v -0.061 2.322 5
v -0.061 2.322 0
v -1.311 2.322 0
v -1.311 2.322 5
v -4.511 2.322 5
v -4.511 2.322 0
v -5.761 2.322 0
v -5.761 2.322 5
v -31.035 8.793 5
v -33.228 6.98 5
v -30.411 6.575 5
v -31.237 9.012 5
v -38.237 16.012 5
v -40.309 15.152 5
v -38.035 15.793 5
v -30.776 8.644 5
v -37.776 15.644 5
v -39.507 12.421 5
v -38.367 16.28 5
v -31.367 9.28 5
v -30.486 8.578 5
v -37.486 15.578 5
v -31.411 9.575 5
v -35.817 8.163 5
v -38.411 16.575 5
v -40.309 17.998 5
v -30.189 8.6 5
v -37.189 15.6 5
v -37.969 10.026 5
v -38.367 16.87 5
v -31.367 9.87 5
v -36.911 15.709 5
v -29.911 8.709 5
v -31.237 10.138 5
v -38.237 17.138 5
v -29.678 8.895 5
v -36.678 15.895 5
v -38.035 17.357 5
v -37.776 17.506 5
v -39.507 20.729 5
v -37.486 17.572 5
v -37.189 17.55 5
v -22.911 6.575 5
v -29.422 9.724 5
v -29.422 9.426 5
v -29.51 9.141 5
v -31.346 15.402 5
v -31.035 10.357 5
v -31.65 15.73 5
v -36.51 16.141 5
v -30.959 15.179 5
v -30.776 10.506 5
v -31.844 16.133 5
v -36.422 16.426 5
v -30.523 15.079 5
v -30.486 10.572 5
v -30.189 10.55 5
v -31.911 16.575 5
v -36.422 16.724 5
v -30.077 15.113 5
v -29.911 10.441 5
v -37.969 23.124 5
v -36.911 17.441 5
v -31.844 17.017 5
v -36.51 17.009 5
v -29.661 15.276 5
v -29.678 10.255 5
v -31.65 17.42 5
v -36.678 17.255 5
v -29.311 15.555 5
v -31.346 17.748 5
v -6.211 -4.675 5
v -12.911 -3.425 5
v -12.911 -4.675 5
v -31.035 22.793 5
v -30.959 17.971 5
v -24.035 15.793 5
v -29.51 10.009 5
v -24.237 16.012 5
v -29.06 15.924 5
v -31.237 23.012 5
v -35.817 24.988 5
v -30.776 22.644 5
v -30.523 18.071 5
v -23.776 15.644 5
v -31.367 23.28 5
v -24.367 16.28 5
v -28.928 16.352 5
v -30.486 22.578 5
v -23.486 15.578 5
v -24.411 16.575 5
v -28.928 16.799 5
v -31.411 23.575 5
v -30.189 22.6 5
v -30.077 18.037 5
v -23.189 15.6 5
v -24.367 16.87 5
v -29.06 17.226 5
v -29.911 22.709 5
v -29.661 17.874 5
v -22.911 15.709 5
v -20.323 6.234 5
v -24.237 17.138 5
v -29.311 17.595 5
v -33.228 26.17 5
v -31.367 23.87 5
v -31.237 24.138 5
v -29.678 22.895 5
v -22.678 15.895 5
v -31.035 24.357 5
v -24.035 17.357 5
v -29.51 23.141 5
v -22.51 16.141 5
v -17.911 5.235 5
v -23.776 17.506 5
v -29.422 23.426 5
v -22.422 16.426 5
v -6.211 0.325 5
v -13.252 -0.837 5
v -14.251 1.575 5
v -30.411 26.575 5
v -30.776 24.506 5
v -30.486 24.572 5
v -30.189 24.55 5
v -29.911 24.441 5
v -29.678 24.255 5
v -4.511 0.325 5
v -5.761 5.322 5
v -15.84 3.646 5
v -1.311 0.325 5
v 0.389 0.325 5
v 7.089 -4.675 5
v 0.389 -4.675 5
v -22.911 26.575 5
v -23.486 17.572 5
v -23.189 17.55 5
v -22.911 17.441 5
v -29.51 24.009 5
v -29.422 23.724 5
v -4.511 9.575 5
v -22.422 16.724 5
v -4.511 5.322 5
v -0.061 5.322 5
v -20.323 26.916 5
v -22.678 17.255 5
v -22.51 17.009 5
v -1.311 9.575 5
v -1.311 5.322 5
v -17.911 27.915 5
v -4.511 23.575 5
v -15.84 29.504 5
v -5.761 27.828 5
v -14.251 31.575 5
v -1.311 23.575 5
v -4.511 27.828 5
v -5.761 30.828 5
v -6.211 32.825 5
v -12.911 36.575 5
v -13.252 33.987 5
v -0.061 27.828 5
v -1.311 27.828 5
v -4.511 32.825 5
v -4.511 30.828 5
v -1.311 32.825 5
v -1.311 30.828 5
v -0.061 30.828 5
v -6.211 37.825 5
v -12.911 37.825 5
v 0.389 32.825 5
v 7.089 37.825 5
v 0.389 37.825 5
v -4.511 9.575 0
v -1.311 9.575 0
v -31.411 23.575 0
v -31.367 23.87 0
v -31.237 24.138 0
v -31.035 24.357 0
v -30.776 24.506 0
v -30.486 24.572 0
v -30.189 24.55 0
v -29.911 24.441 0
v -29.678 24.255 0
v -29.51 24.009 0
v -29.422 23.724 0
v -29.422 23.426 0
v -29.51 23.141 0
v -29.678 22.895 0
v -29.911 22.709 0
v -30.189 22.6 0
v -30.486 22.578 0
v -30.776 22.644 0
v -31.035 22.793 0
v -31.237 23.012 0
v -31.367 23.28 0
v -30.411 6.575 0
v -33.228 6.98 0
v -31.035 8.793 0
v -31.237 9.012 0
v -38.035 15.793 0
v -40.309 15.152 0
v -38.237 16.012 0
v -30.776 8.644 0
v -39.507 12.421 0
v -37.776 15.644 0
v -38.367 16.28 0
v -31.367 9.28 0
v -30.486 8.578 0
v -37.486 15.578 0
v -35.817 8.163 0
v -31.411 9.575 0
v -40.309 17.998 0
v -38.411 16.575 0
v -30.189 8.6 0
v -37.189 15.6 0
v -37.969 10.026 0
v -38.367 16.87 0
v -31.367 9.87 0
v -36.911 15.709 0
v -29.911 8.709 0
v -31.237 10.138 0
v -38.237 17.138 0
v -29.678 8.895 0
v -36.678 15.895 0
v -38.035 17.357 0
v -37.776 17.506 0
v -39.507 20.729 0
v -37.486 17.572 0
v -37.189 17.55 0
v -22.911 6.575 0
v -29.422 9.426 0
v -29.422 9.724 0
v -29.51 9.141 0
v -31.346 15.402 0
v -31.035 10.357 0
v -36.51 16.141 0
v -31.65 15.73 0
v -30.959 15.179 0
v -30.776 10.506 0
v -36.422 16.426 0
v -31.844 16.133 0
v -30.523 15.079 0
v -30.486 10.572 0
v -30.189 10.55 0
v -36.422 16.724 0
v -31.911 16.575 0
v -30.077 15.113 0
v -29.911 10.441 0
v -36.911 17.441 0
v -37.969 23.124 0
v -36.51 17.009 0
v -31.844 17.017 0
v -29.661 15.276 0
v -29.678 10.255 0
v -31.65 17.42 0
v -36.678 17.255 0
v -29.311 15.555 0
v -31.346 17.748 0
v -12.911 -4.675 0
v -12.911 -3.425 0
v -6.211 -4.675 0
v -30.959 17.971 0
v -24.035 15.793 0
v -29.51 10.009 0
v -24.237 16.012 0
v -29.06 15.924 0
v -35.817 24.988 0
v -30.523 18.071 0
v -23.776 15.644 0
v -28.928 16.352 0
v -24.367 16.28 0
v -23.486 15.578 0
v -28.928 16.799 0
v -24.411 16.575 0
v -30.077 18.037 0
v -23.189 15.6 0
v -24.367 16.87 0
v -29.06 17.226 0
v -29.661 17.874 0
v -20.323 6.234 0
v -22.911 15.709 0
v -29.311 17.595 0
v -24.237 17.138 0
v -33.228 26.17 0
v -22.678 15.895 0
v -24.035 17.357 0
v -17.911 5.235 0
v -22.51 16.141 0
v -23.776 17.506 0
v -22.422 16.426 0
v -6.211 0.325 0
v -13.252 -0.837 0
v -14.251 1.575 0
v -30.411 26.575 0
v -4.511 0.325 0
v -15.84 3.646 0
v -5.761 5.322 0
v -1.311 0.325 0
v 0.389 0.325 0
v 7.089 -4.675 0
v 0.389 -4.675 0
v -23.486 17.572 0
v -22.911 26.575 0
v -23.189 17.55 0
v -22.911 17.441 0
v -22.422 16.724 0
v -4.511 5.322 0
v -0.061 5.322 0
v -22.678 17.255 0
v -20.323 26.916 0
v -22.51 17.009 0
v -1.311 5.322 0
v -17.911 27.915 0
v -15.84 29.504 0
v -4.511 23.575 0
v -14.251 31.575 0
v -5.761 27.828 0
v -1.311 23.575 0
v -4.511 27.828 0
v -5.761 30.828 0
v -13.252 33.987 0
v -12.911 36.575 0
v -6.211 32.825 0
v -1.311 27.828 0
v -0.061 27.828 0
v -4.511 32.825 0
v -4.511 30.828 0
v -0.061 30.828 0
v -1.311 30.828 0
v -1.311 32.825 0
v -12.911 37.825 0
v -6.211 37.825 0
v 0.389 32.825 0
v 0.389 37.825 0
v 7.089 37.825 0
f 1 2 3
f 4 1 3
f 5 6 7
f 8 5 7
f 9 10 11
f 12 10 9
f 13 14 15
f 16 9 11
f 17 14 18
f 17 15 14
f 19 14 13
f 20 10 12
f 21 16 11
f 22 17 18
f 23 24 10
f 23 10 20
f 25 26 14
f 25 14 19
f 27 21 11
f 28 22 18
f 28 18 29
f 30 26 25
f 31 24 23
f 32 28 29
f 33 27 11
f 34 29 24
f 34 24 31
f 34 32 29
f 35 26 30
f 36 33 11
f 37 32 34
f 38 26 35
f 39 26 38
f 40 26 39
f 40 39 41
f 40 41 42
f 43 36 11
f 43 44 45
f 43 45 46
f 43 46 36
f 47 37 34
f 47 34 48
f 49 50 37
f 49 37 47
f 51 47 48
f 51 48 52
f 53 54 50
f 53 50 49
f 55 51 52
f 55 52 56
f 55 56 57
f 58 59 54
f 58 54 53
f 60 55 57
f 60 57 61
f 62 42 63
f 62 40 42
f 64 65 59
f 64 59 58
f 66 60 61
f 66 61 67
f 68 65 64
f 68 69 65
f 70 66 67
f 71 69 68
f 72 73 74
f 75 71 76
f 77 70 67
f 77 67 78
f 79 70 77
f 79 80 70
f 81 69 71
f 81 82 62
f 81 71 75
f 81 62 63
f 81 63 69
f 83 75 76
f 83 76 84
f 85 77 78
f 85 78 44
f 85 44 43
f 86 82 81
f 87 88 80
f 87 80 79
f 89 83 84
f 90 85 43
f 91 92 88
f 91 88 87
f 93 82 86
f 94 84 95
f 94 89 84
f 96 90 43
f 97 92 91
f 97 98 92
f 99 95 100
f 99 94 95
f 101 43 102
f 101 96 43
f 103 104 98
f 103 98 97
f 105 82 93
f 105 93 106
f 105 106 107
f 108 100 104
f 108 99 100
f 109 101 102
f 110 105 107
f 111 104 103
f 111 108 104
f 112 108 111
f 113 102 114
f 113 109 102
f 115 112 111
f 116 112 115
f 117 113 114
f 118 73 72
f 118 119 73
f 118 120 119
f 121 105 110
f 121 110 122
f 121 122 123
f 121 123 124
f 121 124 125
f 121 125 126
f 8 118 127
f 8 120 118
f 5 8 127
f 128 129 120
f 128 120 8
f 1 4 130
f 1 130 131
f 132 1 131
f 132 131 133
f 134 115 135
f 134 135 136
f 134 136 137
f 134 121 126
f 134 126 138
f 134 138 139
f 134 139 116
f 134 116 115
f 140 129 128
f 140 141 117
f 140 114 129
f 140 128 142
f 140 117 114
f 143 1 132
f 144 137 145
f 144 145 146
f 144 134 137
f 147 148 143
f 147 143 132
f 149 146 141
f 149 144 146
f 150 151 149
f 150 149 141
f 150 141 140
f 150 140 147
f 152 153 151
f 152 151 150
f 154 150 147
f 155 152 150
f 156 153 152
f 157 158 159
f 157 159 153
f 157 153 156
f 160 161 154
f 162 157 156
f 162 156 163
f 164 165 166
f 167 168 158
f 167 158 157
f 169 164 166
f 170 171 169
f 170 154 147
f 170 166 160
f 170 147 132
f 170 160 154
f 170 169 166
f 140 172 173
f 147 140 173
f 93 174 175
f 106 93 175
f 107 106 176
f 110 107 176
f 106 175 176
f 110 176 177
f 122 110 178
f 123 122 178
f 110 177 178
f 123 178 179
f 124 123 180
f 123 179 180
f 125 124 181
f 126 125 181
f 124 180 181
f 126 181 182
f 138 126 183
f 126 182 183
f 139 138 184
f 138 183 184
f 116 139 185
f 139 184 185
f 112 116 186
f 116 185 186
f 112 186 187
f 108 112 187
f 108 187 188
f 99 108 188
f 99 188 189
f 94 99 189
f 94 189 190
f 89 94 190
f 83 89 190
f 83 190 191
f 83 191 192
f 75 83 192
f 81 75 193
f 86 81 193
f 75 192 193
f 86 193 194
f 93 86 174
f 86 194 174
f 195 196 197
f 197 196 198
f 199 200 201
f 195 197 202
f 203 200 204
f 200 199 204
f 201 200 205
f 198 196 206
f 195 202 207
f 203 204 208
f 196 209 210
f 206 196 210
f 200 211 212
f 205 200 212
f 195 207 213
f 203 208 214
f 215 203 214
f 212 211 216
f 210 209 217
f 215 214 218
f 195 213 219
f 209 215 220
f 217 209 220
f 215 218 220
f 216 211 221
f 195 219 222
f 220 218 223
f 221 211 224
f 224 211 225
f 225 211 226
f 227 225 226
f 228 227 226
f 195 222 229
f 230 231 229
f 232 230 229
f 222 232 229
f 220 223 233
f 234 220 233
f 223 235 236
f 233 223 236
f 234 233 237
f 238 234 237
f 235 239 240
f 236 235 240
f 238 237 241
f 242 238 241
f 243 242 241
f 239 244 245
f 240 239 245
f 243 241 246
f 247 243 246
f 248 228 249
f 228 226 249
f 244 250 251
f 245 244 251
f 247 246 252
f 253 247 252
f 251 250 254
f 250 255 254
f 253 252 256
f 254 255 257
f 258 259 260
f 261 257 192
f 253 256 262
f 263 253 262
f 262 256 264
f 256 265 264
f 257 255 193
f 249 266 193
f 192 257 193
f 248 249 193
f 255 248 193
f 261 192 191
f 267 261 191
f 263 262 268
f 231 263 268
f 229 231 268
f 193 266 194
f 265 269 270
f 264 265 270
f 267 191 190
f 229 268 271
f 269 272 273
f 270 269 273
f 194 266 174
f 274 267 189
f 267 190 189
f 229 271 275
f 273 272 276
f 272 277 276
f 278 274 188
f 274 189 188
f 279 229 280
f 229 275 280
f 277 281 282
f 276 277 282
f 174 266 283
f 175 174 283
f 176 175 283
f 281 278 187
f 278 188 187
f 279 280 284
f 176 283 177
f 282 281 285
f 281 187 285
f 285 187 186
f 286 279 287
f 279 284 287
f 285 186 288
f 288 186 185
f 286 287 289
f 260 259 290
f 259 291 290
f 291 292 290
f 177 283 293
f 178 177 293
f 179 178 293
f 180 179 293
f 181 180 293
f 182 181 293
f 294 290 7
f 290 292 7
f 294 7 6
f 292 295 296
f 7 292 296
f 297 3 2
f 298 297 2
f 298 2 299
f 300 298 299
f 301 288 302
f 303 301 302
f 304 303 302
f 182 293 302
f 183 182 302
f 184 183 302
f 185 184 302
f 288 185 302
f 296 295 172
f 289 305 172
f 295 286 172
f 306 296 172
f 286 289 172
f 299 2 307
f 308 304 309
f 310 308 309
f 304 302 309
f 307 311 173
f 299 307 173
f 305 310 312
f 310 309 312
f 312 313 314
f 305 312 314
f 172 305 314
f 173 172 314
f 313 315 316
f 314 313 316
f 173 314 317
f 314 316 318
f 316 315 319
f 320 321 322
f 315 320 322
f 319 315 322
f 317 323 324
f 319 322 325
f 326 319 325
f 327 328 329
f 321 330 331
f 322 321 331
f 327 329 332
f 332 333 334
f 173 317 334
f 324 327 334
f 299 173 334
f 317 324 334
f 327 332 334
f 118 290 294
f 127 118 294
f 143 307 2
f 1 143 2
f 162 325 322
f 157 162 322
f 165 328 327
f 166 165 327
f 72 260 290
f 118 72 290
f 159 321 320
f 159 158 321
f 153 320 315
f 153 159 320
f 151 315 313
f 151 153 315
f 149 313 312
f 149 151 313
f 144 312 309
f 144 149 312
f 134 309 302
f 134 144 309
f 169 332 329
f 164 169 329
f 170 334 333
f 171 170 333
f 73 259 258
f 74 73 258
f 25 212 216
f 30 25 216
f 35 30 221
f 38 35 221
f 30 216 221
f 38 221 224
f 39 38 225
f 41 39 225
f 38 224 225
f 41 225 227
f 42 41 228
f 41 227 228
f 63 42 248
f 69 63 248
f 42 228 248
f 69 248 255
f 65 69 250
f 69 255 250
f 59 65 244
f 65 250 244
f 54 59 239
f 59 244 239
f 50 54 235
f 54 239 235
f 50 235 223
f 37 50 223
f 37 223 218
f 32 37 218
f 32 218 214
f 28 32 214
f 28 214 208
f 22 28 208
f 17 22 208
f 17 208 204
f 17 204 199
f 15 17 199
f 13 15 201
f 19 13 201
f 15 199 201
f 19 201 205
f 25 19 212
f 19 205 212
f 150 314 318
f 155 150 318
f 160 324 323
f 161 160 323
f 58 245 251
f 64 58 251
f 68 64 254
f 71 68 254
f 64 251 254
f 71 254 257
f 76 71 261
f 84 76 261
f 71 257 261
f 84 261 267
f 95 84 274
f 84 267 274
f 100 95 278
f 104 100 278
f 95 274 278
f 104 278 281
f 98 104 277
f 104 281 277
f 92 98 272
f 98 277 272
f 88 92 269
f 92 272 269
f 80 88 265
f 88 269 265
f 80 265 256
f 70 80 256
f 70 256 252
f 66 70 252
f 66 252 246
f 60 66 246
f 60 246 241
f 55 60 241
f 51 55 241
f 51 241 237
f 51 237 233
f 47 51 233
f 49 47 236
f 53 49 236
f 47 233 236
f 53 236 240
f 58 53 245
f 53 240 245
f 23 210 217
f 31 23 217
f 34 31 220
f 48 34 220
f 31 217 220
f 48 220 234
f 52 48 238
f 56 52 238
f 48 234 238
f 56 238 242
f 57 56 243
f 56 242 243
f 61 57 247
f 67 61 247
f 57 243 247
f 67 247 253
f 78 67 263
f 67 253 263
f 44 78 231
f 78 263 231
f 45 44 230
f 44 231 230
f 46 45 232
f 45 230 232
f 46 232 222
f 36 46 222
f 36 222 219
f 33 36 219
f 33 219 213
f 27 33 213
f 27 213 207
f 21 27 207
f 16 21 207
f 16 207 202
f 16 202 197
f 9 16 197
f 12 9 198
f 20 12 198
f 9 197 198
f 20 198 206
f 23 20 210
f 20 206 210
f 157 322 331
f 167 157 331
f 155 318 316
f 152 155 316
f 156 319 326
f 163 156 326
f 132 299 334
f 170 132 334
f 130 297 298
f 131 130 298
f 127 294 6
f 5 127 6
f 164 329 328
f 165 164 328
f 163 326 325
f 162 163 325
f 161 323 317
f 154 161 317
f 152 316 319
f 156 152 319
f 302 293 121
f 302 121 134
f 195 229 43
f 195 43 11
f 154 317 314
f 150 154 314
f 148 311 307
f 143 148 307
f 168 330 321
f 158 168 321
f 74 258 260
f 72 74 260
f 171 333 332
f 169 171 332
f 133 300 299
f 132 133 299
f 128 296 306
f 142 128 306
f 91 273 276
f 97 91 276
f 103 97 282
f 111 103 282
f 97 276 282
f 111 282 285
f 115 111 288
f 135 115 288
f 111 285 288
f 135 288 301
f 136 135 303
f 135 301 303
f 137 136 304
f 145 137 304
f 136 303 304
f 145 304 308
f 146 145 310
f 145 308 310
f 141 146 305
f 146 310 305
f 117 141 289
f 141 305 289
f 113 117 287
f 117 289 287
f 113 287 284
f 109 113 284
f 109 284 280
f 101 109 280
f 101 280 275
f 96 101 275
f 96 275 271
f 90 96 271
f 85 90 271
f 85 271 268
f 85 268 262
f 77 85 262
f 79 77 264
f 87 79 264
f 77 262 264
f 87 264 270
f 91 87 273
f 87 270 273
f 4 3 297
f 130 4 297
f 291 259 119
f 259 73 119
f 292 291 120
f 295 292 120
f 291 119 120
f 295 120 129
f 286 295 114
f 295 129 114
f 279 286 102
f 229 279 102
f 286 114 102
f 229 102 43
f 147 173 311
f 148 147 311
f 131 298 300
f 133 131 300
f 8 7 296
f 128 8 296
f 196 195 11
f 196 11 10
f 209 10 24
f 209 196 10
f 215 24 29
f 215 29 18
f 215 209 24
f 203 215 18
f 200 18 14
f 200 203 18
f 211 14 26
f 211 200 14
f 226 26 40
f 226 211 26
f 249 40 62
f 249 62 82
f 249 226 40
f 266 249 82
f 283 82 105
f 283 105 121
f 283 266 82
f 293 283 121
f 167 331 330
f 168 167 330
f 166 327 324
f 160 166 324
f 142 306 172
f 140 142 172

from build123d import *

# Parameters (mm, degrees)
BOSS_EXTRU_1_DEPTH = 5
ESQUISSE2_R        = 1.5
ESQUISSE2_R_2      = 1
BOSS_EXTRU_2_DEPTH = 5
CONG_1_R           = 10


with BuildPart() as part:
    # Esquisse1 → Boss.-Extru.1 (new body)
    with BuildSketch(Plane.XY):
        Polygon((-12.911051911, 37.825067336), (-12.911051911, -4.674932664), (-6.211051911, -4.674932664), (-6.211051911, 0.325067336), (-4.511051911, 0.325067336), (-4.511051911, 2.321763371), (-5.761051911, 2.321763371), (-5.761051911, 5.321763371), (-4.511051911, 5.321763371), (-4.511051911, 9.575067336), (-1.311051911, 9.575067336), (-1.311051911, 5.321763371), (-0.061051911, 5.321763371), (-0.061051911, 2.321763371), (-1.311051911, 2.321763371), (-1.311051911, 0.325067336), (0.388948089, 0.325067336), (0.388948089, -4.674932664), (7.088948089, -4.674932664), (7.088948089, 37.825067336), (0.388948089, 37.825067336), (0.388948089, 32.825067336), (-1.311051911, 32.825067336), (-1.311051911, 30.828371301), (-0.061051911, 30.828371301), (-0.061051911, 27.828371301), (-1.311051911, 27.828371301), (-1.311051911, 23.575067336), (-4.511051911, 23.575067336), (-4.511051911, 27.828371301), (-5.761051911, 27.828371301), (-5.761051911, 30.828371301), (-4.511051911, 30.828371301), (-4.511051911, 32.825067336), (-6.211051911, 32.825067336), (-6.211051911, 37.825067336), align=None)
    extrude(amount=BOSS_EXTRU_1_DEPTH)

    # Esquisse2 → Boss.-Extru.2 (add)
    with BuildSketch(Plane(origin=(0, 0, 0), x_dir=(-1, 0, 0), z_dir=(0, 0, -1))):
        with BuildLine():
            Line((30.411051911, 26.575067336), (12.911051911, 26.575067336))
            Line((12.911051911, 26.575067336), (12.911051911, 6.575067336))
            Line((12.911051911, 6.575067336), (30.411051911, 6.575067336))
            ThreePointArc((30.411051911, 6.575067336), (40.411051911, 16.575067336), (30.411051911, 26.575067336))
        make_face()
        with Locations((30.411051911, 16.575067336)):
            Circle(ESQUISSE2_R, mode=Mode.SUBTRACT)
        with Locations((30.411051911, 23.575067336)):
            Circle(ESQUISSE2_R_2, mode=Mode.SUBTRACT)
        with Locations((23.411051911, 16.575067336)):
            Circle(ESQUISSE2_R_2, mode=Mode.SUBTRACT)
        with Locations((30.411051911, 9.575067336)):
            Circle(ESQUISSE2_R_2, mode=Mode.SUBTRACT)
        with Locations((37.411051911, 16.575067336)):
            Circle(ESQUISSE2_R_2, mode=Mode.SUBTRACT)
    extrude(amount=-BOSS_EXTRU_2_DEPTH)

    # Congé1
    cong_1_edges = [part.edges().sort_by_distance(p)[0] for p in [
        (-12.911051911, 26.575067336, 2.5),
        (-12.911051911, 6.575067336, 2.5),
    ]]
    fillet(cong_1_edges, radius=CONG_1_R)


solid = part.part
